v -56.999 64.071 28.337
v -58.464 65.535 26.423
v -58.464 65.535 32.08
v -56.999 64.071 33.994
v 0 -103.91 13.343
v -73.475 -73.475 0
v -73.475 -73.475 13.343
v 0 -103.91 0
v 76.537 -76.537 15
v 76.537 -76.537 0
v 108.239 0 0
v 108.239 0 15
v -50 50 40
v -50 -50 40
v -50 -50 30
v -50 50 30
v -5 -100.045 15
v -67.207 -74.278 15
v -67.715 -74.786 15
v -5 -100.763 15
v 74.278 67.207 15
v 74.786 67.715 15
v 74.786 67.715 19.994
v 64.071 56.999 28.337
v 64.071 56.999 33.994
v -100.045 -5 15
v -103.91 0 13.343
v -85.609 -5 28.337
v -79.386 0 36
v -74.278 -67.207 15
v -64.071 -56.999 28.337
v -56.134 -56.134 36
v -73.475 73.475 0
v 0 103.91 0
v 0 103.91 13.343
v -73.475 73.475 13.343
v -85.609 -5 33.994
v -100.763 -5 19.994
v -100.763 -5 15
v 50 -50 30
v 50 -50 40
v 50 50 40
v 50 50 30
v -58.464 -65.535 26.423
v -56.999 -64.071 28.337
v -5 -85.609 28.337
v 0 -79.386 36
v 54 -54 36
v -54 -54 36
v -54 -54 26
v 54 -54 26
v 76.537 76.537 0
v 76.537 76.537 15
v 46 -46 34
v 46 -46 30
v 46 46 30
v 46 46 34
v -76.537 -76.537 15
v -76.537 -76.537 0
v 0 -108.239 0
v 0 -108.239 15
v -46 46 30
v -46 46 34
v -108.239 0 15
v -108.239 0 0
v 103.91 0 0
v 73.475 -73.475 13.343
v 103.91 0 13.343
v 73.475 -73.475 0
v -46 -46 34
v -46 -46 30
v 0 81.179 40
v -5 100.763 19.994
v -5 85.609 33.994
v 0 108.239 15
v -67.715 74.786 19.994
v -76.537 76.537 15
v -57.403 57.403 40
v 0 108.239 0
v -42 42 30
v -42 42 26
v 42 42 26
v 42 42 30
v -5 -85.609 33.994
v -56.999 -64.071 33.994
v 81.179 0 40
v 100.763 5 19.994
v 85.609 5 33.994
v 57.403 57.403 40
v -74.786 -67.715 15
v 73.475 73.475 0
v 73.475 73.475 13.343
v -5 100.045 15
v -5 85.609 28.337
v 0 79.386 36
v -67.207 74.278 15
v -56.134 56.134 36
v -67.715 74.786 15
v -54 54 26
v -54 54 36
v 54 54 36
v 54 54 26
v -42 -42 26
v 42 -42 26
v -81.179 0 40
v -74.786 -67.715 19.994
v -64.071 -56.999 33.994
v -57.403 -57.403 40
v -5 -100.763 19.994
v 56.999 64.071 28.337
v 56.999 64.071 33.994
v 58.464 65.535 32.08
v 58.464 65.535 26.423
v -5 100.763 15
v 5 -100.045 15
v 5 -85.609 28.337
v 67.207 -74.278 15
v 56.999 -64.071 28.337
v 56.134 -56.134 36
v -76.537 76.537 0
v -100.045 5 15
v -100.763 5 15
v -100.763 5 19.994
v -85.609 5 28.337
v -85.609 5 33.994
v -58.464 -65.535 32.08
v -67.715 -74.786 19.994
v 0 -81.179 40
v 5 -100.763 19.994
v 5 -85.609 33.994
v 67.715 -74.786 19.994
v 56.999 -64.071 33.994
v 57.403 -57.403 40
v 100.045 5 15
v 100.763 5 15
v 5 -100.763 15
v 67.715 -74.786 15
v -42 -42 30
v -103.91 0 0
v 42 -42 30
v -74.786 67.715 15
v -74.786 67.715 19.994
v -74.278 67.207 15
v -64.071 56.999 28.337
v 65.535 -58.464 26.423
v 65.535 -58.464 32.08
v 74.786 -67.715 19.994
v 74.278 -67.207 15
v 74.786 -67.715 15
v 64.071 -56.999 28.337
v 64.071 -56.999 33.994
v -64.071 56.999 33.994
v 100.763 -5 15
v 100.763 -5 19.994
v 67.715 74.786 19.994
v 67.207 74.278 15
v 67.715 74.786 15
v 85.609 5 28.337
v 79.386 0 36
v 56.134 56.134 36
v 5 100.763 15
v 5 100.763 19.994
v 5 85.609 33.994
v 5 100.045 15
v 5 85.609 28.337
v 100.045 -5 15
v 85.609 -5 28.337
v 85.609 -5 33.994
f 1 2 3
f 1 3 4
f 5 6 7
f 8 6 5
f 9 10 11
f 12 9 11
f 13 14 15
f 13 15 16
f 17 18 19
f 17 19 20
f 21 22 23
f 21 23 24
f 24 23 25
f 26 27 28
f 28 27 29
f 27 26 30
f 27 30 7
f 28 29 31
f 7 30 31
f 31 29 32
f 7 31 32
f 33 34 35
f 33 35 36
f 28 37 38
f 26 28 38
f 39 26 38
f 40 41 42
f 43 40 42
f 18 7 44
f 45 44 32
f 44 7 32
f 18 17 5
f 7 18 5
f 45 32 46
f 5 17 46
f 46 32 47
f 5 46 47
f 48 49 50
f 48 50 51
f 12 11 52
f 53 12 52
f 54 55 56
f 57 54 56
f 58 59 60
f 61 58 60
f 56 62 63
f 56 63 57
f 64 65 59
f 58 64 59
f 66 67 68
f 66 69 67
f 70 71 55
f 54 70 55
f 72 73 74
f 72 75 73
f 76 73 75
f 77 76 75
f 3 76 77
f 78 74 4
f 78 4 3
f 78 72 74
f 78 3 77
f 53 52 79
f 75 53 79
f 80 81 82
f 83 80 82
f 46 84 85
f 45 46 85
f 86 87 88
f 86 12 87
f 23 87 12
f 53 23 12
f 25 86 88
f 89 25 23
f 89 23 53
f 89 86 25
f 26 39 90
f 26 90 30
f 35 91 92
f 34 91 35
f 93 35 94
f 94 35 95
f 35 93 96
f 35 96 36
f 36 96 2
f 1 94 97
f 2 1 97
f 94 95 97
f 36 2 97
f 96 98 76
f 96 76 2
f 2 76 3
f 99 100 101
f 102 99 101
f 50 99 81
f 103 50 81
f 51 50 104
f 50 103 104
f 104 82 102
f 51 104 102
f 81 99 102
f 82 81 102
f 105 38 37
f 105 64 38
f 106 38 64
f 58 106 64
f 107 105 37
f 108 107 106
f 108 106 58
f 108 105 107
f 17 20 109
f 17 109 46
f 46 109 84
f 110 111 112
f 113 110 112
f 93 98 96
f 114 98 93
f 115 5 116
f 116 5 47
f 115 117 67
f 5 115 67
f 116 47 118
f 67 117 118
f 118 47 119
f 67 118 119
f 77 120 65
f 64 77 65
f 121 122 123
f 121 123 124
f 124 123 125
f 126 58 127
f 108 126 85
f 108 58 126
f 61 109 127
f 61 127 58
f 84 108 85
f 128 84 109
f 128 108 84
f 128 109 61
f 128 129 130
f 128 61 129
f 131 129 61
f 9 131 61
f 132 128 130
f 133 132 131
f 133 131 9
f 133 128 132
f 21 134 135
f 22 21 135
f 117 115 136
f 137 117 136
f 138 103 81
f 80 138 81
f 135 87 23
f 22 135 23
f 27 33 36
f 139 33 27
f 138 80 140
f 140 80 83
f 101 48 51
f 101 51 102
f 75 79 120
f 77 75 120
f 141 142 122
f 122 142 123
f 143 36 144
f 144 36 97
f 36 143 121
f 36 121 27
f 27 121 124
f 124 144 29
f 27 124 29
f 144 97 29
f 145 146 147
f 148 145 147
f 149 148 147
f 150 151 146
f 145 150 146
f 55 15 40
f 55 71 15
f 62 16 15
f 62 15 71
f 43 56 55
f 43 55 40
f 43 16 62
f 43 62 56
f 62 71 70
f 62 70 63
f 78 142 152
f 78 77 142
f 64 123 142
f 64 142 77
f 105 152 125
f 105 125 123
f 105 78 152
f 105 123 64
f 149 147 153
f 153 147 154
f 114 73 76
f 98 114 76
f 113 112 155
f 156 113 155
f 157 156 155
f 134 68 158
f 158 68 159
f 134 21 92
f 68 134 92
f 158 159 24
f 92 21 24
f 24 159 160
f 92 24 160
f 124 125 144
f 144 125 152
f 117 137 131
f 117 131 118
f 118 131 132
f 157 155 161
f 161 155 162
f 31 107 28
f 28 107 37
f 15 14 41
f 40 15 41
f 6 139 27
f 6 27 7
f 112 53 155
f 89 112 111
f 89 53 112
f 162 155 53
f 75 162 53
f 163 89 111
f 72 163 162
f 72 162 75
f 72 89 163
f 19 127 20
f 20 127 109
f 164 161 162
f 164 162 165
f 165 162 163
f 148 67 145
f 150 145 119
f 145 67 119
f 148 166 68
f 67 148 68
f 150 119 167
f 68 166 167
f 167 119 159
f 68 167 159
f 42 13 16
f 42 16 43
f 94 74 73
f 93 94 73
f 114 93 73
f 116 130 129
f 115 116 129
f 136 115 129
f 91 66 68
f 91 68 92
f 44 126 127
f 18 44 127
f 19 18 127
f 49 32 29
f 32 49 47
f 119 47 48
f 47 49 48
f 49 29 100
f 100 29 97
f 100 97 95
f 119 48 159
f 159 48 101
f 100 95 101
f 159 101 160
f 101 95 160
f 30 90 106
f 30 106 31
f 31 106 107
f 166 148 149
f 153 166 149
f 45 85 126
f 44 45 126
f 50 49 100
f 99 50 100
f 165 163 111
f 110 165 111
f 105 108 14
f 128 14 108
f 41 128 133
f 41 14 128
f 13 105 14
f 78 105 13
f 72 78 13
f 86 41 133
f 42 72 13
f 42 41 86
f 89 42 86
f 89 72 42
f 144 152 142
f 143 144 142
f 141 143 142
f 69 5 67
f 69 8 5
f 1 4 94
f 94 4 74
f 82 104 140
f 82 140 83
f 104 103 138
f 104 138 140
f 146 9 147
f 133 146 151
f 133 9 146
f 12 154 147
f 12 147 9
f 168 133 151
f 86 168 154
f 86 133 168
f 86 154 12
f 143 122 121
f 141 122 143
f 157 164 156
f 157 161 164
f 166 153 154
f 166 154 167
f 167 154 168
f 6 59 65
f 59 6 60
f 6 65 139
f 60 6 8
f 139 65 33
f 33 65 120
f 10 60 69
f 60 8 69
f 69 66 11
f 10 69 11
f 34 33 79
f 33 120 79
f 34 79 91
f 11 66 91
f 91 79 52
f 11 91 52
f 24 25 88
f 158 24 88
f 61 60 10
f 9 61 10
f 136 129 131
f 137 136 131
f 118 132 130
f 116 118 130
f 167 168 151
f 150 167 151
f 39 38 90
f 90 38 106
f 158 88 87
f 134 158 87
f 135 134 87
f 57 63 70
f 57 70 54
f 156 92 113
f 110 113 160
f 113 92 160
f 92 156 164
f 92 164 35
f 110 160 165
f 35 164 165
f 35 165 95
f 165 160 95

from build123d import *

# Parameters (mm, degrees)
F1_DEPTH = 40
F2_SIZE  = 25
F3_W     = 100
F3_H     = 100
F4_DEPTH = 10
F5_W     = 92
F5_H     = 92
F6_DEPTH = 4
F7_T     = -4
F9_DEPTH = 25


with BuildPart() as f1:
    # F0 (on Top) → F1 (new body)
    with BuildSketch(Plane.XY):
        Polygon((108.2392200292, 0), (76.536686473, 76.536686473), (0, 108.2392200292), (-76.536686473, 76.536686473), (-108.2392200292, 0), (-76.536686473, -76.536686473), (0, -108.2392200292), (76.536686473, -76.536686473), align=None)
    extrude(amount=F1_DEPTH)

    # F2
    f2_edges = [f1.edges().sort_by_distance(p)[0] for p in [
        (38.268343, 92.387953, 40),
        (-38.268343, 92.387953, 40),
        (-92.387953, 38.268343, 40),
        (-92.387953, -38.268343, 40),
        (-38.268343, -92.387953, 40),
        (38.268343, -92.387953, 40),
        (92.387953, -38.268343, 40),
        (92.387953, 38.268343, 40),
    ]]
    chamfer(f2_edges, length=F2_SIZE)

    # F3 (on face) → F4 (cut)
    with BuildSketch(Plane.XY.offset(40)):
        Rectangle(F3_W, F3_H)
    extrude(amount=-F4_DEPTH, mode=Mode.SUBTRACT)

    # F5 (on face) → F6 (join)
    with BuildSketch(Plane.XY.offset(30)):
        Rectangle(F5_W, F5_H)
    extrude(amount=F6_DEPTH)

    # F7
    f7_openings = [f1.faces().sort_by_distance(p)[0] for p in [
        (0, 0, 0),
    ]]
    offset(amount=F7_T, openings=f7_openings, kind=Kind.INTERSECTION)

    # F8 (on face) → F9 (cut)
    with BuildSketch(Plane.XY.offset(40)):
        Polygon((-67.7146268432, -74.7856946551), (-5, -100.7629436527), (-5, -87.6805206605), (-5, -85.6094528486), (-56.999490737, -64.0705585489), (-58.4639568311, -65.5350246429), align=None)
        Polygon((5.000001811, -100.7629429025), (67.7146250322, -74.7856954052), (58.4639555505, -65.5350259235), (56.999488926, -64.070559299), (5.000001811, -85.6094520985), (5.000001811, -87.6805206605), align=None)
        Polygon((65.5350259235, 58.4639555505), (64.070559299, 56.999488926), (85.6094520985, 5.000001811), (87.6805206605, 5.000001811), (100.7629429025, 5.000001811), (74.7856954052, 67.7146250322), align=None)
        Polygon((56.999490737, 64.0705585489), (58.4639568311, 65.5350246429), (67.7146268432, 74.7856946551), (5.000001811, 100.7629429025), (5.000001811, 87.6805206605), (5.000001811, 85.6094520985), align=None)
        Polygon((-67.7146268432, 74.7856946551), (-58.4639568311, 65.5350246429), (-56.999490737, 64.0705585489), (-5, 85.6094528486), (-5, 87.6805206605), (-5, 100.7629436527), align=None)
        Polygon((74.7856946551, -67.7146268432), (100.7629436527, -5), (87.6805206605, -5), (85.6094528486, -5), (64.0705585489, -56.999490737), (65.5350246429, -58.4639568311), align=None)
        Polygon((-74.7856954052, 67.7146250322), (-100.7629429025, 5.000001811), (-87.6805206605, 5.000001811), (-85.6094520985, 5.000001811), (-64.070559299, 56.999488926), (-65.5350259235, 58.4639555505), align=None)
        Polygon((-100.7629436527, -5), (-74.7856954052, -67.7146250322), (-65.5350259235, -58.4639555505), (-64.070559299, -56.999488926), (-85.6094528486, -5), (-87.6805206605, -5), align=None)
    extrude(amount=-F9_DEPTH, mode=Mode.SUBTRACT)


solid = f1.part
